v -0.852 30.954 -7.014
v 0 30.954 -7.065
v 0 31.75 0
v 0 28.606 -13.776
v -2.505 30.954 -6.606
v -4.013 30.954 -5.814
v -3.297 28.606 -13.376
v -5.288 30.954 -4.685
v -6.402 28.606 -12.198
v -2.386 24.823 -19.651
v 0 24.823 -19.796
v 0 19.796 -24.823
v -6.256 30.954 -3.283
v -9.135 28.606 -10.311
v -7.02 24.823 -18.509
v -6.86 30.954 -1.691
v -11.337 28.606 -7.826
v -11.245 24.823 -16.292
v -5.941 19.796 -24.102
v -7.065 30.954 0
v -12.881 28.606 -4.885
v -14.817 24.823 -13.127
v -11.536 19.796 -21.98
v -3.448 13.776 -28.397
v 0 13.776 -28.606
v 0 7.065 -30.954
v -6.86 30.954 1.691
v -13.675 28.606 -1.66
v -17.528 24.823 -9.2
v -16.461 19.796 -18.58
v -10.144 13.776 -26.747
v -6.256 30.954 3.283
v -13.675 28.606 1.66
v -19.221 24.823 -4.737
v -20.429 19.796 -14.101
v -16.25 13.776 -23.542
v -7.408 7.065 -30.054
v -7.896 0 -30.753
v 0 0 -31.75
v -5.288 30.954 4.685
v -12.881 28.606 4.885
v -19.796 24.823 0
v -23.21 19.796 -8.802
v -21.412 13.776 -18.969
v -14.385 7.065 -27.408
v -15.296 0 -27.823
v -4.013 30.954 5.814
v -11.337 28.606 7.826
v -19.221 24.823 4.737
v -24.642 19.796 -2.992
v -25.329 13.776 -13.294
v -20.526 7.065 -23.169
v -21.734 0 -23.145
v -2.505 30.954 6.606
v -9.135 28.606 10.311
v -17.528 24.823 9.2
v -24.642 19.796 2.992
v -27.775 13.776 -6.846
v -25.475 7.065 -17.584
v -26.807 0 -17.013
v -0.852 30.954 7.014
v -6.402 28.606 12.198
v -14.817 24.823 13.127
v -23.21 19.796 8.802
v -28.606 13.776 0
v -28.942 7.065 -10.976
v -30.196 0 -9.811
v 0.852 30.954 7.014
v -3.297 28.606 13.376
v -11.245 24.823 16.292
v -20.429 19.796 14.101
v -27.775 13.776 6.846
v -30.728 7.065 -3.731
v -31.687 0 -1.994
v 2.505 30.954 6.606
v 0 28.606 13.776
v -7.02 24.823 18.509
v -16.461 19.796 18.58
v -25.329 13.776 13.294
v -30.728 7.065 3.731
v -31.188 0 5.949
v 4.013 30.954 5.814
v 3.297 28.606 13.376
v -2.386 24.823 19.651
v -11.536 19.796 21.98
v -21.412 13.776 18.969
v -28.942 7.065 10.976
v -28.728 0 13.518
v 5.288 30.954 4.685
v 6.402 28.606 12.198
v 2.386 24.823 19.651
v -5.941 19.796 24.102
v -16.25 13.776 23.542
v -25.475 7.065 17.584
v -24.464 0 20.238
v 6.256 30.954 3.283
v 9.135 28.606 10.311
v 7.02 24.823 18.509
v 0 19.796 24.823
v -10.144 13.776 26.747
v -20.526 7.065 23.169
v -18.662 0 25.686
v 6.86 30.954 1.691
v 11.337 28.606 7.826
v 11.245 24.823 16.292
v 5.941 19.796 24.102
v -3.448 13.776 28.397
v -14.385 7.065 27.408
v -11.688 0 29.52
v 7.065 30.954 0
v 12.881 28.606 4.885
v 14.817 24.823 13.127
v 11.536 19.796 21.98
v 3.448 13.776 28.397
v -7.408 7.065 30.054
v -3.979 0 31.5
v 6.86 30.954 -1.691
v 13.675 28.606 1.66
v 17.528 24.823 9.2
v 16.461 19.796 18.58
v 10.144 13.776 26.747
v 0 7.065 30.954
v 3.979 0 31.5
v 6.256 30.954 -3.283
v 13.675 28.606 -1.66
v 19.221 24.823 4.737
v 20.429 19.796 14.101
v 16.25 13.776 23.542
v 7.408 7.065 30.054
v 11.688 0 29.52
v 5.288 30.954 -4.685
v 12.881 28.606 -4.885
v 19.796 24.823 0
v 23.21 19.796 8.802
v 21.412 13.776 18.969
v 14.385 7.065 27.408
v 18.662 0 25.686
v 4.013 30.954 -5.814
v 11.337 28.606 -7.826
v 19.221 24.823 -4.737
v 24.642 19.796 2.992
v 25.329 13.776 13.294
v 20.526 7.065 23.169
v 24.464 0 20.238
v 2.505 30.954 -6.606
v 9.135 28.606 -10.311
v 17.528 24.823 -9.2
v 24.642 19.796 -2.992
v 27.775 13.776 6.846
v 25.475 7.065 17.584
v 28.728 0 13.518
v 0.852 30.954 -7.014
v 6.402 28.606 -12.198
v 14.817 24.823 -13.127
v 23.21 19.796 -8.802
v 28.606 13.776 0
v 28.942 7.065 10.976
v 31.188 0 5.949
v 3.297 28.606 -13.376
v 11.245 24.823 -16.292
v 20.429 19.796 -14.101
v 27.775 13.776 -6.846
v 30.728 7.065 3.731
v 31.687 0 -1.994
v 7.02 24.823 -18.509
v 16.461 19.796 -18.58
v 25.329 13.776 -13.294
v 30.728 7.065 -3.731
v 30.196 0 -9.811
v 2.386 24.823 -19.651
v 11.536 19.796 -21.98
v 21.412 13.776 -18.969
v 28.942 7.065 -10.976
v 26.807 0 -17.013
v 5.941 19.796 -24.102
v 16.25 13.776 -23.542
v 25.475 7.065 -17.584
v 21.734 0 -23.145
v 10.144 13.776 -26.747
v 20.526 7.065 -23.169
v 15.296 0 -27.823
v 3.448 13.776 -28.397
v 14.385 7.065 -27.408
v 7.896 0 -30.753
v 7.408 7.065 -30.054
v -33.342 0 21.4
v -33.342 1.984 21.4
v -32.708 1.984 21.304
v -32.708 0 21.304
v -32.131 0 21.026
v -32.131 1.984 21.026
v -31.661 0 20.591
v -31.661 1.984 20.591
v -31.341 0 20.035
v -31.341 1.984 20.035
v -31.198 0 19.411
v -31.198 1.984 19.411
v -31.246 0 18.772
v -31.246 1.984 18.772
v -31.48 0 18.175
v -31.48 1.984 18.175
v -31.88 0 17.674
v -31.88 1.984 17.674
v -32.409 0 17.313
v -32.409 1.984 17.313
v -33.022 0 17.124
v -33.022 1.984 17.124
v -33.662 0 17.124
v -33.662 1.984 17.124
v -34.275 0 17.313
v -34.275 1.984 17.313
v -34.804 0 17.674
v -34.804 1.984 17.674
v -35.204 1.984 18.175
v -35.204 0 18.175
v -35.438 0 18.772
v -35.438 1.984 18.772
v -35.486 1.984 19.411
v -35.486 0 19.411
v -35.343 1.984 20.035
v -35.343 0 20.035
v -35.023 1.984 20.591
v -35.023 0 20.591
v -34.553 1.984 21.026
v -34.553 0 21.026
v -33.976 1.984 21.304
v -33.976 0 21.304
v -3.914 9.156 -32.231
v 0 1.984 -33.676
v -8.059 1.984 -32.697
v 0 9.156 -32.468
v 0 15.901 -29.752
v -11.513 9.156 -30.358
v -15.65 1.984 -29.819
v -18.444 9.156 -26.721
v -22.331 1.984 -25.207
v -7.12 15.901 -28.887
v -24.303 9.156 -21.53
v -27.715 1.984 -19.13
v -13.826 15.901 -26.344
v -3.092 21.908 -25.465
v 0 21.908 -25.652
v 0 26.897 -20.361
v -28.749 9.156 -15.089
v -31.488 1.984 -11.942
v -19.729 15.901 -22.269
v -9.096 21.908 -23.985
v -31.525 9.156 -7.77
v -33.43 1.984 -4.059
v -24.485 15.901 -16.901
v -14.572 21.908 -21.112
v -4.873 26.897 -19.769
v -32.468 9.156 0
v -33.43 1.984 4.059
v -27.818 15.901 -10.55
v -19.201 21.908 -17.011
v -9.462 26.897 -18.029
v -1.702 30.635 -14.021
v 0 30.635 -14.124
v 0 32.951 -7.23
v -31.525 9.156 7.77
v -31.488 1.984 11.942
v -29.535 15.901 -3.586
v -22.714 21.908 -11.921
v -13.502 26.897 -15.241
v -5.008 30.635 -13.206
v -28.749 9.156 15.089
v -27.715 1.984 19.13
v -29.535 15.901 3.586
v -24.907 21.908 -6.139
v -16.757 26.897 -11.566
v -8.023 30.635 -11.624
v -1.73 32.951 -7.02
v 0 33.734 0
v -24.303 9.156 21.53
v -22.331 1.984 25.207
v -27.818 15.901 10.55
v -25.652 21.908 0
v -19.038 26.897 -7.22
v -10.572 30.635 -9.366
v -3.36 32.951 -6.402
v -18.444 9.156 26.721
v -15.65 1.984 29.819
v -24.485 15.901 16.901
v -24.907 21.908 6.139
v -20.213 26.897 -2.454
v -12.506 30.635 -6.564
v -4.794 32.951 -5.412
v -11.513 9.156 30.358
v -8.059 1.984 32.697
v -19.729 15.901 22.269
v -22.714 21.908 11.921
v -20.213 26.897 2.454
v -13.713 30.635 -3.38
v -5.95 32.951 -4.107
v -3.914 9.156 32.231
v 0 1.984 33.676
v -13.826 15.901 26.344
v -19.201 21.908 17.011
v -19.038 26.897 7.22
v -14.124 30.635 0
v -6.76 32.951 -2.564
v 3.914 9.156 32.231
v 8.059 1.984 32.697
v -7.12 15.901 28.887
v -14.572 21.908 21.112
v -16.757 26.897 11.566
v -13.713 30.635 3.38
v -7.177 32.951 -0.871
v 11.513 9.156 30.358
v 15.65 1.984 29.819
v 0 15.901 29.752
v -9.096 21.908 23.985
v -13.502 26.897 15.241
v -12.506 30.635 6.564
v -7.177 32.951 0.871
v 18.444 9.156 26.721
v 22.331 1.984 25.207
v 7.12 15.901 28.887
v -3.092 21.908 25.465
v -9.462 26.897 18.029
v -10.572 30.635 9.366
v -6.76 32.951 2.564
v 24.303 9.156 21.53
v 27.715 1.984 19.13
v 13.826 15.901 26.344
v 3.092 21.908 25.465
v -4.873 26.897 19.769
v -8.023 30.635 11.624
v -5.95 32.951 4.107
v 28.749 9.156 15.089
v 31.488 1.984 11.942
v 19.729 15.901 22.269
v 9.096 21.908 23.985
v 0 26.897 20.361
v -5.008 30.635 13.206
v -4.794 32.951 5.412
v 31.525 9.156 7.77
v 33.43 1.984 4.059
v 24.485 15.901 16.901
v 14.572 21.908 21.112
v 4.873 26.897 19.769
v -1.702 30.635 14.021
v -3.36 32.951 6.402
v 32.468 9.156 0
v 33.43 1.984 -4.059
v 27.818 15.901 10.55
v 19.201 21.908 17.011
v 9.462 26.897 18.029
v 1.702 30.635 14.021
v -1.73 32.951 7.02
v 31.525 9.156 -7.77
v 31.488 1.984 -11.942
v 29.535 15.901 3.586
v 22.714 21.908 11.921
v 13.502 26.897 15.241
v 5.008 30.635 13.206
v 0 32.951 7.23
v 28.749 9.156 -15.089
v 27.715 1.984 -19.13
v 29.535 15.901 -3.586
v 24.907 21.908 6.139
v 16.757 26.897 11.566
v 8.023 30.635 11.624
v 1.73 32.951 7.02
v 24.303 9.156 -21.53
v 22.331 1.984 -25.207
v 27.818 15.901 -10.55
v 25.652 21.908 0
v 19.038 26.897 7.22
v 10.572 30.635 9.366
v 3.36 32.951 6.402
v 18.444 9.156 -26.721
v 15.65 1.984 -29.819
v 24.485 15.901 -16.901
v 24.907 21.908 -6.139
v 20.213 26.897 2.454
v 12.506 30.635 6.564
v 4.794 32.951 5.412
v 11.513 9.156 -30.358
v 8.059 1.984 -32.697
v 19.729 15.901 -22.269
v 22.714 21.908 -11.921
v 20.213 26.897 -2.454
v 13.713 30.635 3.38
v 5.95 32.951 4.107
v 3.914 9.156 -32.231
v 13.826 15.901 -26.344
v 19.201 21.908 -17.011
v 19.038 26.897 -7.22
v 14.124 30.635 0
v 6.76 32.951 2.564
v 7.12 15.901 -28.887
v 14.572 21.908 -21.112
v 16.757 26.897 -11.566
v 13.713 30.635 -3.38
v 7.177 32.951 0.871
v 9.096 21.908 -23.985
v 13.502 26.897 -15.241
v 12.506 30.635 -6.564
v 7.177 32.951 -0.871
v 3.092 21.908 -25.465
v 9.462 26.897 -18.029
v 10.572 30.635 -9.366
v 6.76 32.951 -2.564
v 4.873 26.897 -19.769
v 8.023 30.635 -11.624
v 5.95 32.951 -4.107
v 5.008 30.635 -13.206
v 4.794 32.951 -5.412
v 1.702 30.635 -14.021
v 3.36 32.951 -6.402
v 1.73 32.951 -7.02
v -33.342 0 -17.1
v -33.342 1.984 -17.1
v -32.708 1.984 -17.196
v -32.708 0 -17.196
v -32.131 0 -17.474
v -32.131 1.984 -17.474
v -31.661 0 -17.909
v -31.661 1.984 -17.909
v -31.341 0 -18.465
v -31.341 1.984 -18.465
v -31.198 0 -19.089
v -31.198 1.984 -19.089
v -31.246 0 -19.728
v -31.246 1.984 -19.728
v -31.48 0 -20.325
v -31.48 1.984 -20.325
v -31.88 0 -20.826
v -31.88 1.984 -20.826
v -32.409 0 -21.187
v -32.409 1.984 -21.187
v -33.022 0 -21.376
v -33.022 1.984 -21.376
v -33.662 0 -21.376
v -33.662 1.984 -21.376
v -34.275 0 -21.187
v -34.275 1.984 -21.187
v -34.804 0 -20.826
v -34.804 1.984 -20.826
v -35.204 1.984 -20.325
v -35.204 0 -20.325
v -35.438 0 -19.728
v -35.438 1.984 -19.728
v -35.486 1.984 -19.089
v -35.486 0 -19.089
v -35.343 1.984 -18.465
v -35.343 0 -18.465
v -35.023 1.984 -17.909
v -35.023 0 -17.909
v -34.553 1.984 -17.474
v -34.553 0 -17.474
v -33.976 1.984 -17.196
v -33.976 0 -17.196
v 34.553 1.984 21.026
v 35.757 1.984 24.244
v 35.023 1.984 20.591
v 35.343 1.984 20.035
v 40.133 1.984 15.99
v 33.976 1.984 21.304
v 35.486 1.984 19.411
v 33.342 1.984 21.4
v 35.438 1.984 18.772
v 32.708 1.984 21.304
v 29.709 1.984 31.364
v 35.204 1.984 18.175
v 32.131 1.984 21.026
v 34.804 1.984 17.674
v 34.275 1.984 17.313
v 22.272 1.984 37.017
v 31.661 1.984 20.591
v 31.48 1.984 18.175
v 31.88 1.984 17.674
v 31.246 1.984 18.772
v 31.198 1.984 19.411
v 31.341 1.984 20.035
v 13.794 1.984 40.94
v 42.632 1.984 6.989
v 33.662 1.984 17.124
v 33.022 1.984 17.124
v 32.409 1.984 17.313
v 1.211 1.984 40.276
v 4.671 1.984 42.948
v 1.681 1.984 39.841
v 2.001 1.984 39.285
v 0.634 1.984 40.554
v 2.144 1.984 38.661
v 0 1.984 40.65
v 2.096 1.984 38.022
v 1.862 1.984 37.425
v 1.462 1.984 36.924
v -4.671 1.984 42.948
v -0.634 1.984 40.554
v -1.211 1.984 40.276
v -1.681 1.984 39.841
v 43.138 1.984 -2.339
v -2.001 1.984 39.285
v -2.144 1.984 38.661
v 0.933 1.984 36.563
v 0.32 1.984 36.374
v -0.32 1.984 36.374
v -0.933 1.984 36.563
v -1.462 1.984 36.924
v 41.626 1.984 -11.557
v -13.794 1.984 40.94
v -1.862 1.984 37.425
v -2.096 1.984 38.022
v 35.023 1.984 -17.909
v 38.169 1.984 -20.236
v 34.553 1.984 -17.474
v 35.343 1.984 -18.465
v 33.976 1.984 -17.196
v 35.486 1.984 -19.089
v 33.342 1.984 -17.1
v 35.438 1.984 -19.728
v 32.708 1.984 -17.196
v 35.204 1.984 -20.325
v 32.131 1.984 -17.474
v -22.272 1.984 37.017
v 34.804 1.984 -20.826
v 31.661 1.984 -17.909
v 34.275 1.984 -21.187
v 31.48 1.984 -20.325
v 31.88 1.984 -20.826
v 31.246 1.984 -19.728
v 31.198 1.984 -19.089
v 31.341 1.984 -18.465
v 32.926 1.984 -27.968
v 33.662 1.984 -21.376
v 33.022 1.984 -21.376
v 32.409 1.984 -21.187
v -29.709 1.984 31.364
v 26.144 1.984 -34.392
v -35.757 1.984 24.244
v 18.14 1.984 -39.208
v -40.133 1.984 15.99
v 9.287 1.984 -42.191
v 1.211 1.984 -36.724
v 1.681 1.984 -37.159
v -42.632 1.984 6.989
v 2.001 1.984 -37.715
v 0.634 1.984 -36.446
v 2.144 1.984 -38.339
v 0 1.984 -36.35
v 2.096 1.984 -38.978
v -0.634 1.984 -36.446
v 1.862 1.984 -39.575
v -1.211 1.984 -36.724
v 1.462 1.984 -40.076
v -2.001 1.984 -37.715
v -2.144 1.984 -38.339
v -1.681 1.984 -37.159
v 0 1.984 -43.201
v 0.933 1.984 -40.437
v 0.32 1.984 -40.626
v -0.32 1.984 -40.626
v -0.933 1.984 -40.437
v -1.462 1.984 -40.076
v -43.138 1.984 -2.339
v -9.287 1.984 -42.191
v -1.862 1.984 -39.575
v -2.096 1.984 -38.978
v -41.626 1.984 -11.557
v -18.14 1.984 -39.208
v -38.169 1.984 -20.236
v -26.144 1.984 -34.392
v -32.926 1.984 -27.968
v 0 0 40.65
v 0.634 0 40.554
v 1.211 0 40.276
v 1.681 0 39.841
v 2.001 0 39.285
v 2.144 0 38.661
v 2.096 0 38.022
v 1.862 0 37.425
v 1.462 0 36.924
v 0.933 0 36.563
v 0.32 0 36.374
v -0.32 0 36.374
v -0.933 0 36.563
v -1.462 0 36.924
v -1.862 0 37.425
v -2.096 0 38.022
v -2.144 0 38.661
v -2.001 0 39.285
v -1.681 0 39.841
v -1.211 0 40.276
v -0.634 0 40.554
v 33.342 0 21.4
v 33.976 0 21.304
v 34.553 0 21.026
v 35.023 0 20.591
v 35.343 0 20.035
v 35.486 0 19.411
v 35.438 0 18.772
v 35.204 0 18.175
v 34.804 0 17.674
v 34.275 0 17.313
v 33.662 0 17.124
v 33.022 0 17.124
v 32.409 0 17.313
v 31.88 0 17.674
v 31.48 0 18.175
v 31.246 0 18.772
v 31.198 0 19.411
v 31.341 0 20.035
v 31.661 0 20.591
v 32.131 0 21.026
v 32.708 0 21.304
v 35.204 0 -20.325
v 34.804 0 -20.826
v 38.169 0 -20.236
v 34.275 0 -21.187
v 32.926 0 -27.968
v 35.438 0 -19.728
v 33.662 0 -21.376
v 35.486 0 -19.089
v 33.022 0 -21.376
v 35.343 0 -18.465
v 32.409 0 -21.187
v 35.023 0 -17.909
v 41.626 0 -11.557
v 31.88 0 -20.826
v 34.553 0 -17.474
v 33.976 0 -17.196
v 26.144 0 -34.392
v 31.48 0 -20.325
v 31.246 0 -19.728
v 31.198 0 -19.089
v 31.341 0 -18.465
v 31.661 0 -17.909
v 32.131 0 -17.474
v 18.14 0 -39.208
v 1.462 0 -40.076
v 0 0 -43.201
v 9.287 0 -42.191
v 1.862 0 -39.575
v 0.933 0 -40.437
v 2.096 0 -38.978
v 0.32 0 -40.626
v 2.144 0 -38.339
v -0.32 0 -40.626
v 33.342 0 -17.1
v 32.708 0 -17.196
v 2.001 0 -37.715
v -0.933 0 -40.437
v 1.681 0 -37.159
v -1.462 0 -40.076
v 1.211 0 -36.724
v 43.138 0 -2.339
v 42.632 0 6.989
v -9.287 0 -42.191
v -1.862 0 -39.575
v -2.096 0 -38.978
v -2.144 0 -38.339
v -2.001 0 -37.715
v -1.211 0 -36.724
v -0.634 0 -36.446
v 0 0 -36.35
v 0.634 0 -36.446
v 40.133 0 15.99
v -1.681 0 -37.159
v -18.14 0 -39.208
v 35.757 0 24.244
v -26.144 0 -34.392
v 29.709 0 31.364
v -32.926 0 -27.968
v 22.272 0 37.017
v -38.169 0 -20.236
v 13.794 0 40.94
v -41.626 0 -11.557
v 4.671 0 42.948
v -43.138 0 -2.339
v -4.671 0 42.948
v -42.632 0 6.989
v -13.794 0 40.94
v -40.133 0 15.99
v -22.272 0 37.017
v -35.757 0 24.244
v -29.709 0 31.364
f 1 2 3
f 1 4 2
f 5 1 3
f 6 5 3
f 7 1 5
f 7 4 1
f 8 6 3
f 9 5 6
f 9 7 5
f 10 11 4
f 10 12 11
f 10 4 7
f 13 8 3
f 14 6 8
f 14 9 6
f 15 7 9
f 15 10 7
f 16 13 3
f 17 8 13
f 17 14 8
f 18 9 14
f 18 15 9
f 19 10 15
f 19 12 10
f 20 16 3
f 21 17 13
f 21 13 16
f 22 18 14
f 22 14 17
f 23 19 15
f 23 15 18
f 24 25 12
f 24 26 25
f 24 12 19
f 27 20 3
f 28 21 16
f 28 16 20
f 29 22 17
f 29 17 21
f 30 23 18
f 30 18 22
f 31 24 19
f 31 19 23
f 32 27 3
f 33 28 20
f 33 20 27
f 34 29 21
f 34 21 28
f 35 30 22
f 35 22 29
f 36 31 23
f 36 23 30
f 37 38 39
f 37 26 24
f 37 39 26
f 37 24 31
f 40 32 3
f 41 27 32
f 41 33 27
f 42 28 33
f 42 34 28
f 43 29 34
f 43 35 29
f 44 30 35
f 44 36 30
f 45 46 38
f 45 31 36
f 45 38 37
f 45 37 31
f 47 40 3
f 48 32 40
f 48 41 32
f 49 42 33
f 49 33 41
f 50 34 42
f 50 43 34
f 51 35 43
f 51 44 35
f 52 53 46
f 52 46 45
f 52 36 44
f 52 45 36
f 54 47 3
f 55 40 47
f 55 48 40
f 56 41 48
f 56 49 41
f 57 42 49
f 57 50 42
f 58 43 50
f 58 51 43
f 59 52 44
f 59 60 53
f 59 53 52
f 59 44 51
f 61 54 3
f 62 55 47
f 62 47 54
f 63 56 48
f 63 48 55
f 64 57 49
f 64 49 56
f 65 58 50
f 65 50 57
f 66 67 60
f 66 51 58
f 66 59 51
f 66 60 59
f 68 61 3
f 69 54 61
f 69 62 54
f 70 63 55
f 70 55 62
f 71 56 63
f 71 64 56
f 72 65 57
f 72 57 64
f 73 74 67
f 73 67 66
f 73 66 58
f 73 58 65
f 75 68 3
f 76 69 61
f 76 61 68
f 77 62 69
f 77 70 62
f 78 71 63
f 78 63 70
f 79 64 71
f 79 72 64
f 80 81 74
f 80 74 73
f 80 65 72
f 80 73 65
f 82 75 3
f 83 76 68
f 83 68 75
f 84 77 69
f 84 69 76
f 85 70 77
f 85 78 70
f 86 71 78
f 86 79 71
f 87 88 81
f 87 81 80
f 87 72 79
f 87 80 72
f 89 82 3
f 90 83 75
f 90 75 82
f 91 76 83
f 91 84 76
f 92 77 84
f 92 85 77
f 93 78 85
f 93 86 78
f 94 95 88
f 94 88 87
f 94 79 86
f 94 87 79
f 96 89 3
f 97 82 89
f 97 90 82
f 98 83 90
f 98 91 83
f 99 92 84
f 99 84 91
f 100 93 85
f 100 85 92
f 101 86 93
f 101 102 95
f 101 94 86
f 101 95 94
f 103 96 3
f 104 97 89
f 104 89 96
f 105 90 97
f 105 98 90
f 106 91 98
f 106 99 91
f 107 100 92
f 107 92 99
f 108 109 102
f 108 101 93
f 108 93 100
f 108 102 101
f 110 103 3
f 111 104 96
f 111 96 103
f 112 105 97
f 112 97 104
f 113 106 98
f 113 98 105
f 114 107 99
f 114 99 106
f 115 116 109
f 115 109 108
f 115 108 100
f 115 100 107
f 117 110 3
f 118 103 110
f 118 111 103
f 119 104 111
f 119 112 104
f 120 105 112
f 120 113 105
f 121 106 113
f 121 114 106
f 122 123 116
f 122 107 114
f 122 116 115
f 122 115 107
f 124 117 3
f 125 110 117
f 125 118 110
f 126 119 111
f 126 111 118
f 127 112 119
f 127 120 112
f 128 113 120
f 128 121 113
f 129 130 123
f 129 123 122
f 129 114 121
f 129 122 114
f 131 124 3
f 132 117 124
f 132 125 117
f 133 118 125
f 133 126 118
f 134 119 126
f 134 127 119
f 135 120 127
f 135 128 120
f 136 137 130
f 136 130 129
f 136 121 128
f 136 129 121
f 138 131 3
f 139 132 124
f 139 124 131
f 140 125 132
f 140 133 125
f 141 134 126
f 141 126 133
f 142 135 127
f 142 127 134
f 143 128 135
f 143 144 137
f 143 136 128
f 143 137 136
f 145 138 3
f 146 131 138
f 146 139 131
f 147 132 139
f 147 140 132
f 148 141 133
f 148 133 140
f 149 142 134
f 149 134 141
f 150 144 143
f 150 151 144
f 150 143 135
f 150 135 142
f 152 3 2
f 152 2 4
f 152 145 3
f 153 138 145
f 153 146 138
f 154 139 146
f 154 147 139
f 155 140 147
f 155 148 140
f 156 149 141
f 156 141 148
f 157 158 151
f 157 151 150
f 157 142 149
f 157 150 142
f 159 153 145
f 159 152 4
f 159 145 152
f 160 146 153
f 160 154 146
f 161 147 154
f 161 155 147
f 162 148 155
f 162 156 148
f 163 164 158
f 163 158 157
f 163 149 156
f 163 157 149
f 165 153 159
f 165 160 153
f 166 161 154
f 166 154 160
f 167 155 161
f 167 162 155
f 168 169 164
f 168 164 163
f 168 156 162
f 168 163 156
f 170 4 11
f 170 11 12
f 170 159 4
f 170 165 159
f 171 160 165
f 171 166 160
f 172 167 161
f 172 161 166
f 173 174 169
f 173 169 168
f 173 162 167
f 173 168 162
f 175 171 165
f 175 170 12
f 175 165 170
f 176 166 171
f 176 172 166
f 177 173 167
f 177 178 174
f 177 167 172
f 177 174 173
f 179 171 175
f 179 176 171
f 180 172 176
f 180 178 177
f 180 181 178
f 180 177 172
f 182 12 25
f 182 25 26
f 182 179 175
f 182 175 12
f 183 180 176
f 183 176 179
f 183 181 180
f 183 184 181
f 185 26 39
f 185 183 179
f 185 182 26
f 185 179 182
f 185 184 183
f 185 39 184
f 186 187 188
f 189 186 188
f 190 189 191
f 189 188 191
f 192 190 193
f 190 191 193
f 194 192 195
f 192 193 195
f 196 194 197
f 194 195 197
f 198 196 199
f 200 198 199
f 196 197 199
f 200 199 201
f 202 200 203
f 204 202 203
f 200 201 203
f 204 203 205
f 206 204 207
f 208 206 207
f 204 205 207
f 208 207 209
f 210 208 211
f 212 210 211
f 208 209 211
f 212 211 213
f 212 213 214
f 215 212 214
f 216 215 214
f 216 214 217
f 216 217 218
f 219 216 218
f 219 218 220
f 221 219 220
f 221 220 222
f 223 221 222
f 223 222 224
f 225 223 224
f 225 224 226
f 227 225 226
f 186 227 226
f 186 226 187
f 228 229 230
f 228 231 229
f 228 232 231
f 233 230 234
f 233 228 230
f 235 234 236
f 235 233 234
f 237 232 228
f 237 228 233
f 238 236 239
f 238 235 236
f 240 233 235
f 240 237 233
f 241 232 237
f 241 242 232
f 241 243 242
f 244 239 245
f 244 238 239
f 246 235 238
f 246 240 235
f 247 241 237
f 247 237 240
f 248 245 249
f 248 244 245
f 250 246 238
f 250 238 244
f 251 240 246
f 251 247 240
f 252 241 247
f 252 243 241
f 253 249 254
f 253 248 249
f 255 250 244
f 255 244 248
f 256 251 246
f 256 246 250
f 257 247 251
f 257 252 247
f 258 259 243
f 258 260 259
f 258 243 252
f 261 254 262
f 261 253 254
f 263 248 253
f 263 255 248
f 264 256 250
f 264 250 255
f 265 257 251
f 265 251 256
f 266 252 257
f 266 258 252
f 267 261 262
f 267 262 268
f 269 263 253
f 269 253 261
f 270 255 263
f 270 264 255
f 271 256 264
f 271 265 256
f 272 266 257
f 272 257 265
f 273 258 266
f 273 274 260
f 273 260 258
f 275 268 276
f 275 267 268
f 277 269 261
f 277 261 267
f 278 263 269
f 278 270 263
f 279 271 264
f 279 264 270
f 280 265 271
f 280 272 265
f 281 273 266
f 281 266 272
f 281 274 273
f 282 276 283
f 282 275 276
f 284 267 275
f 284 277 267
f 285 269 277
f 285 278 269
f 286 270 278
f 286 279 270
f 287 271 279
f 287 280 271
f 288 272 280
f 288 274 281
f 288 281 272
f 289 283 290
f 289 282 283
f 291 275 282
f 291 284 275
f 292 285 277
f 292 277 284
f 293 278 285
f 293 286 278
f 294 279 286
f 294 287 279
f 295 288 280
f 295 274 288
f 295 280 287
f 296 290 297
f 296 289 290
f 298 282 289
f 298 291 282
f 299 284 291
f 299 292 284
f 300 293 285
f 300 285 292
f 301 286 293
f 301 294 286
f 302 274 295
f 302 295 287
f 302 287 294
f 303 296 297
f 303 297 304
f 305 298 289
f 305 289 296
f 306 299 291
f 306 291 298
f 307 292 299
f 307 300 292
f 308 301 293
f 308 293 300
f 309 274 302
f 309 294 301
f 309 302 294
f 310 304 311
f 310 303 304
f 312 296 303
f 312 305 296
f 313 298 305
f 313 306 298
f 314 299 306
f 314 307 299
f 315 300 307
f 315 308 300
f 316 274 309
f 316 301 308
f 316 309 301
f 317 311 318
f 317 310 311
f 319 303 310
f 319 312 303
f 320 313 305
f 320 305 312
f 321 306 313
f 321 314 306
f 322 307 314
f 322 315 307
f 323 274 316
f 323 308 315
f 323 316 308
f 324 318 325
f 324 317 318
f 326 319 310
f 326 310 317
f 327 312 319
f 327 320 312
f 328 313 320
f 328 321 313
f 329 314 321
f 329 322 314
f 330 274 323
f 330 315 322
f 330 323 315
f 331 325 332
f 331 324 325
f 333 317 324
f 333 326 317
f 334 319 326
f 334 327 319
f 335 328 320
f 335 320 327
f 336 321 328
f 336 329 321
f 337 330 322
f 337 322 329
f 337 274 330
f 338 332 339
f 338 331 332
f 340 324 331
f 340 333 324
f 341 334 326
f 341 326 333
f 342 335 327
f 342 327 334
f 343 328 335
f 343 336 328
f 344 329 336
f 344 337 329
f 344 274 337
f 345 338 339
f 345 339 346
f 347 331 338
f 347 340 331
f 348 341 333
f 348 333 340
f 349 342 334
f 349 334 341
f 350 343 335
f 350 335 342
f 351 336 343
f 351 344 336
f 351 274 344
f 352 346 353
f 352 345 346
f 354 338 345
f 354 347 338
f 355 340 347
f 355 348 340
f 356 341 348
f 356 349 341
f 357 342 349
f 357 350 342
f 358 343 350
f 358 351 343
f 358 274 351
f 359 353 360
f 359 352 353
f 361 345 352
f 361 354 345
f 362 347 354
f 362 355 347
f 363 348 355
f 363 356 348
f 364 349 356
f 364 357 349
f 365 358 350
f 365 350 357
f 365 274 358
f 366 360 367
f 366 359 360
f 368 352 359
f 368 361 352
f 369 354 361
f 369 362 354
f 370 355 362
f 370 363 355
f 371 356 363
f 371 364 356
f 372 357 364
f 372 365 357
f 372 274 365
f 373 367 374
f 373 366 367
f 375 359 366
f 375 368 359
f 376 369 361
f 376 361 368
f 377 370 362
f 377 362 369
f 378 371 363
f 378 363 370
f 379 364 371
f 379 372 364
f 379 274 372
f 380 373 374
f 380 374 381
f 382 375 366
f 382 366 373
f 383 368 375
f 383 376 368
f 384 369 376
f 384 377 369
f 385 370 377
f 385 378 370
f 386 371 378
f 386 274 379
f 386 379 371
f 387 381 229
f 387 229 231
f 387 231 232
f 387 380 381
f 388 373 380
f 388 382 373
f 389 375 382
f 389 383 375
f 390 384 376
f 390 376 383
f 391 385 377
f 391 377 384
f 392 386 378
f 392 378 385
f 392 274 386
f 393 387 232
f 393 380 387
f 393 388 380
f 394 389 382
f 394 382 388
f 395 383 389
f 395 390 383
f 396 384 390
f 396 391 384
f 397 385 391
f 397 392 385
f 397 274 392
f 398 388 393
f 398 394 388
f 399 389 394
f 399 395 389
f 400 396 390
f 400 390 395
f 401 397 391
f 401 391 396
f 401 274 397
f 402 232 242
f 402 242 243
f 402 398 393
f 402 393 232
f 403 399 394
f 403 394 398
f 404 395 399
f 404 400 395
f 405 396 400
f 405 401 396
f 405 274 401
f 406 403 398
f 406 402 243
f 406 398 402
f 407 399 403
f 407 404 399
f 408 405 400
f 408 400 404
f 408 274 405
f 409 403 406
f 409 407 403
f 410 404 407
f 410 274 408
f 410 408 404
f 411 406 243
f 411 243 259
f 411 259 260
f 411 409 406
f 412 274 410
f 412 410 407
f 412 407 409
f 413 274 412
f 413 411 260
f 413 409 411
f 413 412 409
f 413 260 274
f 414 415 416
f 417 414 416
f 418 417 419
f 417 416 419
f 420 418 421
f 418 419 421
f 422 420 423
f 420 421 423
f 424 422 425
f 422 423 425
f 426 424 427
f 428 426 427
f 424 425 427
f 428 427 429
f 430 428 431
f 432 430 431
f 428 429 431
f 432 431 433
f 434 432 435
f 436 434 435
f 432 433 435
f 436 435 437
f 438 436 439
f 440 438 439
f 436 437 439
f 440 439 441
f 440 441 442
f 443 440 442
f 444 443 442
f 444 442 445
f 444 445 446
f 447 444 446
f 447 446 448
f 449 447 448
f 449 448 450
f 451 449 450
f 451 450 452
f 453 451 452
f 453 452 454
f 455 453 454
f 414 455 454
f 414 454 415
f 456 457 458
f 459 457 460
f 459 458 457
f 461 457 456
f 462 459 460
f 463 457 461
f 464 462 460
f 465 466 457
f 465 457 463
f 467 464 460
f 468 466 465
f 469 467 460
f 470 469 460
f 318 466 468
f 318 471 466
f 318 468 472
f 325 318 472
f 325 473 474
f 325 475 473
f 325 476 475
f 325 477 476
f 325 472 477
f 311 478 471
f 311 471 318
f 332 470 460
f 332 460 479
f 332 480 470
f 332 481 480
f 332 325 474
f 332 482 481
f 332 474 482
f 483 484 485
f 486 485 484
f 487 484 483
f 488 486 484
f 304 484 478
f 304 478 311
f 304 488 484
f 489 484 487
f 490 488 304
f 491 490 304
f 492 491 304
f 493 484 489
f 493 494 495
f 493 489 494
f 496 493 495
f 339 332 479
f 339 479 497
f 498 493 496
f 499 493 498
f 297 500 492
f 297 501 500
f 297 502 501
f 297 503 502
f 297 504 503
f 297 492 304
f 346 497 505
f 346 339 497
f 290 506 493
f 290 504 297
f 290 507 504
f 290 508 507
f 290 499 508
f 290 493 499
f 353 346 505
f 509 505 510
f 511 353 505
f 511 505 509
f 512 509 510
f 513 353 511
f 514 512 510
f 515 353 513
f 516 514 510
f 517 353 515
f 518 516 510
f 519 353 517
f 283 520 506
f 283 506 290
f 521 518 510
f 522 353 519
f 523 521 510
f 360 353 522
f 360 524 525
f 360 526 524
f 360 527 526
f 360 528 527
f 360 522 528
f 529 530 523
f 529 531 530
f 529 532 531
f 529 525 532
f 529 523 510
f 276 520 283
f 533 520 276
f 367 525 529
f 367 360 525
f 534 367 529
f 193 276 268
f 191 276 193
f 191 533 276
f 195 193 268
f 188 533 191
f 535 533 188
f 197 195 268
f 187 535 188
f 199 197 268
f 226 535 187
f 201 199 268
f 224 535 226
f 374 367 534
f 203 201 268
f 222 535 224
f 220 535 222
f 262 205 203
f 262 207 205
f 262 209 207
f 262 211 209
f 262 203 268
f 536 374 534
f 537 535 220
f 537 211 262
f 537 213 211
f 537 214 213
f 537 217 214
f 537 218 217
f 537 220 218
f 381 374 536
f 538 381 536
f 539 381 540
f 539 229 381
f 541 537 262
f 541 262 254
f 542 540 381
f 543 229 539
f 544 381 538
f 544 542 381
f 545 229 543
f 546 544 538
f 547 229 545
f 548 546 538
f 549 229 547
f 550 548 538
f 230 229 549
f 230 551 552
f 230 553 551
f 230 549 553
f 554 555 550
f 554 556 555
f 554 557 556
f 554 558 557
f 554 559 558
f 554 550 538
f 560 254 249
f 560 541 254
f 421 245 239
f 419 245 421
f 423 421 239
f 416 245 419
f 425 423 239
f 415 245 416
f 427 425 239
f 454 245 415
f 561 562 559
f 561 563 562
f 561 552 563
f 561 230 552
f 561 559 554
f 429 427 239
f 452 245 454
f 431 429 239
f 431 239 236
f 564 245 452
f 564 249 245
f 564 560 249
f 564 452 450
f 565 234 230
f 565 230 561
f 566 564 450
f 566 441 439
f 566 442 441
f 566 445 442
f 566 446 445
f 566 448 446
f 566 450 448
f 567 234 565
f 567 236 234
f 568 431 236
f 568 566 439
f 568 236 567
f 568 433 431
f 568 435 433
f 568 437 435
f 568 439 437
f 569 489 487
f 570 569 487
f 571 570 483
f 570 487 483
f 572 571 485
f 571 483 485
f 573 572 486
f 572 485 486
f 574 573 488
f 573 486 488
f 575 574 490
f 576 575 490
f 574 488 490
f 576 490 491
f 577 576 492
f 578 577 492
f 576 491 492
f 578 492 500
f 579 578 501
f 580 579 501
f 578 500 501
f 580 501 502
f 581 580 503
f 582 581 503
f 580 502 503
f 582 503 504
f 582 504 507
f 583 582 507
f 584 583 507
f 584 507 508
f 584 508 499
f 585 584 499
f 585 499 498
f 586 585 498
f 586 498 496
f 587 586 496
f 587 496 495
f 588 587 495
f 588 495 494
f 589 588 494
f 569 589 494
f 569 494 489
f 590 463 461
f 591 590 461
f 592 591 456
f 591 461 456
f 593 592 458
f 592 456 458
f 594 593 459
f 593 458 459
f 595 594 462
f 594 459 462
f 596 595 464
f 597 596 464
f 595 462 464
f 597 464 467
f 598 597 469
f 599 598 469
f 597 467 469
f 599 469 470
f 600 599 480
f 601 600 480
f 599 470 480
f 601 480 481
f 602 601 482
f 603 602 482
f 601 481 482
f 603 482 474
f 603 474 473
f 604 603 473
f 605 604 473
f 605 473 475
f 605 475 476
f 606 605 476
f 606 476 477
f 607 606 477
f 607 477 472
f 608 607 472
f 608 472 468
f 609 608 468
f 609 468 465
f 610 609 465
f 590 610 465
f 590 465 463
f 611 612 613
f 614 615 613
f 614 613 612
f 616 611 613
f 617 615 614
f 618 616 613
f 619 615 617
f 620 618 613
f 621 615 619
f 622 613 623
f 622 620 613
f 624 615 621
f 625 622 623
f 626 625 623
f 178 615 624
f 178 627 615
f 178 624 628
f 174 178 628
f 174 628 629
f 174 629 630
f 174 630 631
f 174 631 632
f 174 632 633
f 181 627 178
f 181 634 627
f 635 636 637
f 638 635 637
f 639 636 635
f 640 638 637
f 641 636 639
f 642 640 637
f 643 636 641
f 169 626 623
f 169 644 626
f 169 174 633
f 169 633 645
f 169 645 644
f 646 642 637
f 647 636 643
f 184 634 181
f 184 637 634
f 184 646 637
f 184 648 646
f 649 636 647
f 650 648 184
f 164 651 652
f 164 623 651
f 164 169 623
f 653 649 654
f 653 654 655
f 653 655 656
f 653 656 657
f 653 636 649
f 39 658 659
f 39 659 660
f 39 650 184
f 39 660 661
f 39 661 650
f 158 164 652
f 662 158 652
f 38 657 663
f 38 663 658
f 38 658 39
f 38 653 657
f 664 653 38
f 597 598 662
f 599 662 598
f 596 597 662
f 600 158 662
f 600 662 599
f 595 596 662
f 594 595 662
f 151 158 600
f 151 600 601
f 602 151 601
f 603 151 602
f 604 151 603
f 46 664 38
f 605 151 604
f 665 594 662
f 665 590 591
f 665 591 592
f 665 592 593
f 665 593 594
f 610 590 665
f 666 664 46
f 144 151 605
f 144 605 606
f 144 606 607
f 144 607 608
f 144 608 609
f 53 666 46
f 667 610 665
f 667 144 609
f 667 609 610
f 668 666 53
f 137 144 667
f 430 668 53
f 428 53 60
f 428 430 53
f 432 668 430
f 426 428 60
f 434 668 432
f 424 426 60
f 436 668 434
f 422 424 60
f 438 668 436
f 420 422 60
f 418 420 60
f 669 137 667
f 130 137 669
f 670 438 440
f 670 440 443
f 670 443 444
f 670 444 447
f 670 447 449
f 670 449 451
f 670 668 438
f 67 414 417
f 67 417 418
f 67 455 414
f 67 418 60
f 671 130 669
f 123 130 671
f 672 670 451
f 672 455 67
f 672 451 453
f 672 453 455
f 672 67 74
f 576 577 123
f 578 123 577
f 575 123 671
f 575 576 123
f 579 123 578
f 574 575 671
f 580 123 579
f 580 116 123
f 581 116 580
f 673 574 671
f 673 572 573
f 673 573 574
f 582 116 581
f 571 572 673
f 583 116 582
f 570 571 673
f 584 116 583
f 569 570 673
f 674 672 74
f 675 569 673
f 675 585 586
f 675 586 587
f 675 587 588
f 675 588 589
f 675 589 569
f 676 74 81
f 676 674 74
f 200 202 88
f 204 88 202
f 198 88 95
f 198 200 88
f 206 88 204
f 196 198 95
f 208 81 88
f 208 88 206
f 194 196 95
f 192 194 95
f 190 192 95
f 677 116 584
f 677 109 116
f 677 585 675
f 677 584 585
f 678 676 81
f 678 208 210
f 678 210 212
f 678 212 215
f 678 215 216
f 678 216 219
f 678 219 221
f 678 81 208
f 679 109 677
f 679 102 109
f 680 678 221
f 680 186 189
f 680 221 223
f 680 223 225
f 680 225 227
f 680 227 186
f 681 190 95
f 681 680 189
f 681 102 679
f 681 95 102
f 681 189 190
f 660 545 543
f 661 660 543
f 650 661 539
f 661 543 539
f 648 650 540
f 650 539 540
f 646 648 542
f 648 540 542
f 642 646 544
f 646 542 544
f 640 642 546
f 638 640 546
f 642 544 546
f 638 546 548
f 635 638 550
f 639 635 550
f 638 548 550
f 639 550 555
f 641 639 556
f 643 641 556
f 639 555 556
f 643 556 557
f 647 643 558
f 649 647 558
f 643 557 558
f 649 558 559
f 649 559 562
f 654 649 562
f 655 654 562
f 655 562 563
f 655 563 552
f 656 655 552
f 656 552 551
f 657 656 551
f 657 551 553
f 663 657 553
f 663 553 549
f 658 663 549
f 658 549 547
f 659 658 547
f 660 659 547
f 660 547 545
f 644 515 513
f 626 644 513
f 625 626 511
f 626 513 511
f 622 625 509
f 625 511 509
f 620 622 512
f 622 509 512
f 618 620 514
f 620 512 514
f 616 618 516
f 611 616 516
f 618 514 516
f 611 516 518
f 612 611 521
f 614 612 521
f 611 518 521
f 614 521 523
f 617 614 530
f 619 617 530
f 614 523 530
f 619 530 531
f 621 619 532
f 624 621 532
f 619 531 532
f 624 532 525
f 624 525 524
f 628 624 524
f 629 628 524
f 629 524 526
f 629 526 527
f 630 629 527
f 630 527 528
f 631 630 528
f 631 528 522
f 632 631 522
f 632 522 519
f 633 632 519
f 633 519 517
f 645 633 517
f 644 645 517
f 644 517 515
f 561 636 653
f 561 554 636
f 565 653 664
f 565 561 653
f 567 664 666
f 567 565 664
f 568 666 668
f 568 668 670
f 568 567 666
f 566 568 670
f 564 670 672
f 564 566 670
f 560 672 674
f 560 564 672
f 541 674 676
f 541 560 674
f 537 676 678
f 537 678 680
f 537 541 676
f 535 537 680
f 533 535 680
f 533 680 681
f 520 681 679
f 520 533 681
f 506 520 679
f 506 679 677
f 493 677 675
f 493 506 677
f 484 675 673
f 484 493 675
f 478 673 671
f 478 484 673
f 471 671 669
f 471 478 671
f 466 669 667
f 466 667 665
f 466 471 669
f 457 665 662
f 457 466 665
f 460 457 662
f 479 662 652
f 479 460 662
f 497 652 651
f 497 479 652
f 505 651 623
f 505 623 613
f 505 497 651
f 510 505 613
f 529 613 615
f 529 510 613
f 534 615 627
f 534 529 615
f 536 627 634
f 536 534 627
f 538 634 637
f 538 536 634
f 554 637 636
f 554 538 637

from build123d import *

# Parameters (mm, degrees)
SKETCH2_R          = 2.15
CUT_EXTRUDE1_DEPTH = 10


with BuildPart() as part:
    # Sketch1 → Revolve1 (revolve)
    with BuildSketch(Plane(origin=(0, 0, 0), x_dir=(0, 0, -1), z_dir=(1, 0, 0)), mode=Mode.PRIVATE) as revolve1_sk:
        with BuildLine():
            Line((-31.75, 0), (-43.200960454, 0))
            Line((-43.200960454, 0), (-43.200960454, 1.984375))
            Line((-43.200960454, 1.984375), (-33.675960454, 1.984375))
            ThreePointArc((-33.675960454, 1.984375), (-23.141590333, 24.545363178), (0, 33.734375))
            Line((0, 33.734375), (0, 31.75))
            ThreePointArc((0, 31.75), (-22.450640303, 22.450640303), (-31.75, 0))
        make_face()
    revolve(revolve1_sk.sketch.rotate(Axis((0, -1000, 0), (0, 1, 0)), 180), axis=Axis((0, -1000, 0), (0, 1, 0)))

    # Sketch2 → Cut-Extrude1 (cut)
    with BuildSketch(Plane(origin=(0, 1.984375, 0), x_dir=(1, 0, 0), z_dir=(0, 1, 0))):
        with Locations(Location((0, -38.5, 0), (0, 0, 270))):
            Circle(SKETCH2_R)
        with Locations(Location((-33.341978046, -19.25, 0), (0, 0, 270))):
            Circle(SKETCH2_R)
        with Locations(Location((-33.341978046, 19.25, 0), (0, 0, 270))):
            Circle(SKETCH2_R)
        with Locations(Location((0, 38.5, 0), (0, 0, 270))):
            Circle(SKETCH2_R)
        with Locations(Location((33.341978046, 19.25, 0), (0, 0, 270))):
            Circle(SKETCH2_R)
        with Locations(Location((33.341978046, -19.25, 0), (0, 0, 270))):
            Circle(SKETCH2_R)
    extrude(amount=-CUT_EXTRUDE1_DEPTH, mode=Mode.SUBTRACT)


solid = part.part
